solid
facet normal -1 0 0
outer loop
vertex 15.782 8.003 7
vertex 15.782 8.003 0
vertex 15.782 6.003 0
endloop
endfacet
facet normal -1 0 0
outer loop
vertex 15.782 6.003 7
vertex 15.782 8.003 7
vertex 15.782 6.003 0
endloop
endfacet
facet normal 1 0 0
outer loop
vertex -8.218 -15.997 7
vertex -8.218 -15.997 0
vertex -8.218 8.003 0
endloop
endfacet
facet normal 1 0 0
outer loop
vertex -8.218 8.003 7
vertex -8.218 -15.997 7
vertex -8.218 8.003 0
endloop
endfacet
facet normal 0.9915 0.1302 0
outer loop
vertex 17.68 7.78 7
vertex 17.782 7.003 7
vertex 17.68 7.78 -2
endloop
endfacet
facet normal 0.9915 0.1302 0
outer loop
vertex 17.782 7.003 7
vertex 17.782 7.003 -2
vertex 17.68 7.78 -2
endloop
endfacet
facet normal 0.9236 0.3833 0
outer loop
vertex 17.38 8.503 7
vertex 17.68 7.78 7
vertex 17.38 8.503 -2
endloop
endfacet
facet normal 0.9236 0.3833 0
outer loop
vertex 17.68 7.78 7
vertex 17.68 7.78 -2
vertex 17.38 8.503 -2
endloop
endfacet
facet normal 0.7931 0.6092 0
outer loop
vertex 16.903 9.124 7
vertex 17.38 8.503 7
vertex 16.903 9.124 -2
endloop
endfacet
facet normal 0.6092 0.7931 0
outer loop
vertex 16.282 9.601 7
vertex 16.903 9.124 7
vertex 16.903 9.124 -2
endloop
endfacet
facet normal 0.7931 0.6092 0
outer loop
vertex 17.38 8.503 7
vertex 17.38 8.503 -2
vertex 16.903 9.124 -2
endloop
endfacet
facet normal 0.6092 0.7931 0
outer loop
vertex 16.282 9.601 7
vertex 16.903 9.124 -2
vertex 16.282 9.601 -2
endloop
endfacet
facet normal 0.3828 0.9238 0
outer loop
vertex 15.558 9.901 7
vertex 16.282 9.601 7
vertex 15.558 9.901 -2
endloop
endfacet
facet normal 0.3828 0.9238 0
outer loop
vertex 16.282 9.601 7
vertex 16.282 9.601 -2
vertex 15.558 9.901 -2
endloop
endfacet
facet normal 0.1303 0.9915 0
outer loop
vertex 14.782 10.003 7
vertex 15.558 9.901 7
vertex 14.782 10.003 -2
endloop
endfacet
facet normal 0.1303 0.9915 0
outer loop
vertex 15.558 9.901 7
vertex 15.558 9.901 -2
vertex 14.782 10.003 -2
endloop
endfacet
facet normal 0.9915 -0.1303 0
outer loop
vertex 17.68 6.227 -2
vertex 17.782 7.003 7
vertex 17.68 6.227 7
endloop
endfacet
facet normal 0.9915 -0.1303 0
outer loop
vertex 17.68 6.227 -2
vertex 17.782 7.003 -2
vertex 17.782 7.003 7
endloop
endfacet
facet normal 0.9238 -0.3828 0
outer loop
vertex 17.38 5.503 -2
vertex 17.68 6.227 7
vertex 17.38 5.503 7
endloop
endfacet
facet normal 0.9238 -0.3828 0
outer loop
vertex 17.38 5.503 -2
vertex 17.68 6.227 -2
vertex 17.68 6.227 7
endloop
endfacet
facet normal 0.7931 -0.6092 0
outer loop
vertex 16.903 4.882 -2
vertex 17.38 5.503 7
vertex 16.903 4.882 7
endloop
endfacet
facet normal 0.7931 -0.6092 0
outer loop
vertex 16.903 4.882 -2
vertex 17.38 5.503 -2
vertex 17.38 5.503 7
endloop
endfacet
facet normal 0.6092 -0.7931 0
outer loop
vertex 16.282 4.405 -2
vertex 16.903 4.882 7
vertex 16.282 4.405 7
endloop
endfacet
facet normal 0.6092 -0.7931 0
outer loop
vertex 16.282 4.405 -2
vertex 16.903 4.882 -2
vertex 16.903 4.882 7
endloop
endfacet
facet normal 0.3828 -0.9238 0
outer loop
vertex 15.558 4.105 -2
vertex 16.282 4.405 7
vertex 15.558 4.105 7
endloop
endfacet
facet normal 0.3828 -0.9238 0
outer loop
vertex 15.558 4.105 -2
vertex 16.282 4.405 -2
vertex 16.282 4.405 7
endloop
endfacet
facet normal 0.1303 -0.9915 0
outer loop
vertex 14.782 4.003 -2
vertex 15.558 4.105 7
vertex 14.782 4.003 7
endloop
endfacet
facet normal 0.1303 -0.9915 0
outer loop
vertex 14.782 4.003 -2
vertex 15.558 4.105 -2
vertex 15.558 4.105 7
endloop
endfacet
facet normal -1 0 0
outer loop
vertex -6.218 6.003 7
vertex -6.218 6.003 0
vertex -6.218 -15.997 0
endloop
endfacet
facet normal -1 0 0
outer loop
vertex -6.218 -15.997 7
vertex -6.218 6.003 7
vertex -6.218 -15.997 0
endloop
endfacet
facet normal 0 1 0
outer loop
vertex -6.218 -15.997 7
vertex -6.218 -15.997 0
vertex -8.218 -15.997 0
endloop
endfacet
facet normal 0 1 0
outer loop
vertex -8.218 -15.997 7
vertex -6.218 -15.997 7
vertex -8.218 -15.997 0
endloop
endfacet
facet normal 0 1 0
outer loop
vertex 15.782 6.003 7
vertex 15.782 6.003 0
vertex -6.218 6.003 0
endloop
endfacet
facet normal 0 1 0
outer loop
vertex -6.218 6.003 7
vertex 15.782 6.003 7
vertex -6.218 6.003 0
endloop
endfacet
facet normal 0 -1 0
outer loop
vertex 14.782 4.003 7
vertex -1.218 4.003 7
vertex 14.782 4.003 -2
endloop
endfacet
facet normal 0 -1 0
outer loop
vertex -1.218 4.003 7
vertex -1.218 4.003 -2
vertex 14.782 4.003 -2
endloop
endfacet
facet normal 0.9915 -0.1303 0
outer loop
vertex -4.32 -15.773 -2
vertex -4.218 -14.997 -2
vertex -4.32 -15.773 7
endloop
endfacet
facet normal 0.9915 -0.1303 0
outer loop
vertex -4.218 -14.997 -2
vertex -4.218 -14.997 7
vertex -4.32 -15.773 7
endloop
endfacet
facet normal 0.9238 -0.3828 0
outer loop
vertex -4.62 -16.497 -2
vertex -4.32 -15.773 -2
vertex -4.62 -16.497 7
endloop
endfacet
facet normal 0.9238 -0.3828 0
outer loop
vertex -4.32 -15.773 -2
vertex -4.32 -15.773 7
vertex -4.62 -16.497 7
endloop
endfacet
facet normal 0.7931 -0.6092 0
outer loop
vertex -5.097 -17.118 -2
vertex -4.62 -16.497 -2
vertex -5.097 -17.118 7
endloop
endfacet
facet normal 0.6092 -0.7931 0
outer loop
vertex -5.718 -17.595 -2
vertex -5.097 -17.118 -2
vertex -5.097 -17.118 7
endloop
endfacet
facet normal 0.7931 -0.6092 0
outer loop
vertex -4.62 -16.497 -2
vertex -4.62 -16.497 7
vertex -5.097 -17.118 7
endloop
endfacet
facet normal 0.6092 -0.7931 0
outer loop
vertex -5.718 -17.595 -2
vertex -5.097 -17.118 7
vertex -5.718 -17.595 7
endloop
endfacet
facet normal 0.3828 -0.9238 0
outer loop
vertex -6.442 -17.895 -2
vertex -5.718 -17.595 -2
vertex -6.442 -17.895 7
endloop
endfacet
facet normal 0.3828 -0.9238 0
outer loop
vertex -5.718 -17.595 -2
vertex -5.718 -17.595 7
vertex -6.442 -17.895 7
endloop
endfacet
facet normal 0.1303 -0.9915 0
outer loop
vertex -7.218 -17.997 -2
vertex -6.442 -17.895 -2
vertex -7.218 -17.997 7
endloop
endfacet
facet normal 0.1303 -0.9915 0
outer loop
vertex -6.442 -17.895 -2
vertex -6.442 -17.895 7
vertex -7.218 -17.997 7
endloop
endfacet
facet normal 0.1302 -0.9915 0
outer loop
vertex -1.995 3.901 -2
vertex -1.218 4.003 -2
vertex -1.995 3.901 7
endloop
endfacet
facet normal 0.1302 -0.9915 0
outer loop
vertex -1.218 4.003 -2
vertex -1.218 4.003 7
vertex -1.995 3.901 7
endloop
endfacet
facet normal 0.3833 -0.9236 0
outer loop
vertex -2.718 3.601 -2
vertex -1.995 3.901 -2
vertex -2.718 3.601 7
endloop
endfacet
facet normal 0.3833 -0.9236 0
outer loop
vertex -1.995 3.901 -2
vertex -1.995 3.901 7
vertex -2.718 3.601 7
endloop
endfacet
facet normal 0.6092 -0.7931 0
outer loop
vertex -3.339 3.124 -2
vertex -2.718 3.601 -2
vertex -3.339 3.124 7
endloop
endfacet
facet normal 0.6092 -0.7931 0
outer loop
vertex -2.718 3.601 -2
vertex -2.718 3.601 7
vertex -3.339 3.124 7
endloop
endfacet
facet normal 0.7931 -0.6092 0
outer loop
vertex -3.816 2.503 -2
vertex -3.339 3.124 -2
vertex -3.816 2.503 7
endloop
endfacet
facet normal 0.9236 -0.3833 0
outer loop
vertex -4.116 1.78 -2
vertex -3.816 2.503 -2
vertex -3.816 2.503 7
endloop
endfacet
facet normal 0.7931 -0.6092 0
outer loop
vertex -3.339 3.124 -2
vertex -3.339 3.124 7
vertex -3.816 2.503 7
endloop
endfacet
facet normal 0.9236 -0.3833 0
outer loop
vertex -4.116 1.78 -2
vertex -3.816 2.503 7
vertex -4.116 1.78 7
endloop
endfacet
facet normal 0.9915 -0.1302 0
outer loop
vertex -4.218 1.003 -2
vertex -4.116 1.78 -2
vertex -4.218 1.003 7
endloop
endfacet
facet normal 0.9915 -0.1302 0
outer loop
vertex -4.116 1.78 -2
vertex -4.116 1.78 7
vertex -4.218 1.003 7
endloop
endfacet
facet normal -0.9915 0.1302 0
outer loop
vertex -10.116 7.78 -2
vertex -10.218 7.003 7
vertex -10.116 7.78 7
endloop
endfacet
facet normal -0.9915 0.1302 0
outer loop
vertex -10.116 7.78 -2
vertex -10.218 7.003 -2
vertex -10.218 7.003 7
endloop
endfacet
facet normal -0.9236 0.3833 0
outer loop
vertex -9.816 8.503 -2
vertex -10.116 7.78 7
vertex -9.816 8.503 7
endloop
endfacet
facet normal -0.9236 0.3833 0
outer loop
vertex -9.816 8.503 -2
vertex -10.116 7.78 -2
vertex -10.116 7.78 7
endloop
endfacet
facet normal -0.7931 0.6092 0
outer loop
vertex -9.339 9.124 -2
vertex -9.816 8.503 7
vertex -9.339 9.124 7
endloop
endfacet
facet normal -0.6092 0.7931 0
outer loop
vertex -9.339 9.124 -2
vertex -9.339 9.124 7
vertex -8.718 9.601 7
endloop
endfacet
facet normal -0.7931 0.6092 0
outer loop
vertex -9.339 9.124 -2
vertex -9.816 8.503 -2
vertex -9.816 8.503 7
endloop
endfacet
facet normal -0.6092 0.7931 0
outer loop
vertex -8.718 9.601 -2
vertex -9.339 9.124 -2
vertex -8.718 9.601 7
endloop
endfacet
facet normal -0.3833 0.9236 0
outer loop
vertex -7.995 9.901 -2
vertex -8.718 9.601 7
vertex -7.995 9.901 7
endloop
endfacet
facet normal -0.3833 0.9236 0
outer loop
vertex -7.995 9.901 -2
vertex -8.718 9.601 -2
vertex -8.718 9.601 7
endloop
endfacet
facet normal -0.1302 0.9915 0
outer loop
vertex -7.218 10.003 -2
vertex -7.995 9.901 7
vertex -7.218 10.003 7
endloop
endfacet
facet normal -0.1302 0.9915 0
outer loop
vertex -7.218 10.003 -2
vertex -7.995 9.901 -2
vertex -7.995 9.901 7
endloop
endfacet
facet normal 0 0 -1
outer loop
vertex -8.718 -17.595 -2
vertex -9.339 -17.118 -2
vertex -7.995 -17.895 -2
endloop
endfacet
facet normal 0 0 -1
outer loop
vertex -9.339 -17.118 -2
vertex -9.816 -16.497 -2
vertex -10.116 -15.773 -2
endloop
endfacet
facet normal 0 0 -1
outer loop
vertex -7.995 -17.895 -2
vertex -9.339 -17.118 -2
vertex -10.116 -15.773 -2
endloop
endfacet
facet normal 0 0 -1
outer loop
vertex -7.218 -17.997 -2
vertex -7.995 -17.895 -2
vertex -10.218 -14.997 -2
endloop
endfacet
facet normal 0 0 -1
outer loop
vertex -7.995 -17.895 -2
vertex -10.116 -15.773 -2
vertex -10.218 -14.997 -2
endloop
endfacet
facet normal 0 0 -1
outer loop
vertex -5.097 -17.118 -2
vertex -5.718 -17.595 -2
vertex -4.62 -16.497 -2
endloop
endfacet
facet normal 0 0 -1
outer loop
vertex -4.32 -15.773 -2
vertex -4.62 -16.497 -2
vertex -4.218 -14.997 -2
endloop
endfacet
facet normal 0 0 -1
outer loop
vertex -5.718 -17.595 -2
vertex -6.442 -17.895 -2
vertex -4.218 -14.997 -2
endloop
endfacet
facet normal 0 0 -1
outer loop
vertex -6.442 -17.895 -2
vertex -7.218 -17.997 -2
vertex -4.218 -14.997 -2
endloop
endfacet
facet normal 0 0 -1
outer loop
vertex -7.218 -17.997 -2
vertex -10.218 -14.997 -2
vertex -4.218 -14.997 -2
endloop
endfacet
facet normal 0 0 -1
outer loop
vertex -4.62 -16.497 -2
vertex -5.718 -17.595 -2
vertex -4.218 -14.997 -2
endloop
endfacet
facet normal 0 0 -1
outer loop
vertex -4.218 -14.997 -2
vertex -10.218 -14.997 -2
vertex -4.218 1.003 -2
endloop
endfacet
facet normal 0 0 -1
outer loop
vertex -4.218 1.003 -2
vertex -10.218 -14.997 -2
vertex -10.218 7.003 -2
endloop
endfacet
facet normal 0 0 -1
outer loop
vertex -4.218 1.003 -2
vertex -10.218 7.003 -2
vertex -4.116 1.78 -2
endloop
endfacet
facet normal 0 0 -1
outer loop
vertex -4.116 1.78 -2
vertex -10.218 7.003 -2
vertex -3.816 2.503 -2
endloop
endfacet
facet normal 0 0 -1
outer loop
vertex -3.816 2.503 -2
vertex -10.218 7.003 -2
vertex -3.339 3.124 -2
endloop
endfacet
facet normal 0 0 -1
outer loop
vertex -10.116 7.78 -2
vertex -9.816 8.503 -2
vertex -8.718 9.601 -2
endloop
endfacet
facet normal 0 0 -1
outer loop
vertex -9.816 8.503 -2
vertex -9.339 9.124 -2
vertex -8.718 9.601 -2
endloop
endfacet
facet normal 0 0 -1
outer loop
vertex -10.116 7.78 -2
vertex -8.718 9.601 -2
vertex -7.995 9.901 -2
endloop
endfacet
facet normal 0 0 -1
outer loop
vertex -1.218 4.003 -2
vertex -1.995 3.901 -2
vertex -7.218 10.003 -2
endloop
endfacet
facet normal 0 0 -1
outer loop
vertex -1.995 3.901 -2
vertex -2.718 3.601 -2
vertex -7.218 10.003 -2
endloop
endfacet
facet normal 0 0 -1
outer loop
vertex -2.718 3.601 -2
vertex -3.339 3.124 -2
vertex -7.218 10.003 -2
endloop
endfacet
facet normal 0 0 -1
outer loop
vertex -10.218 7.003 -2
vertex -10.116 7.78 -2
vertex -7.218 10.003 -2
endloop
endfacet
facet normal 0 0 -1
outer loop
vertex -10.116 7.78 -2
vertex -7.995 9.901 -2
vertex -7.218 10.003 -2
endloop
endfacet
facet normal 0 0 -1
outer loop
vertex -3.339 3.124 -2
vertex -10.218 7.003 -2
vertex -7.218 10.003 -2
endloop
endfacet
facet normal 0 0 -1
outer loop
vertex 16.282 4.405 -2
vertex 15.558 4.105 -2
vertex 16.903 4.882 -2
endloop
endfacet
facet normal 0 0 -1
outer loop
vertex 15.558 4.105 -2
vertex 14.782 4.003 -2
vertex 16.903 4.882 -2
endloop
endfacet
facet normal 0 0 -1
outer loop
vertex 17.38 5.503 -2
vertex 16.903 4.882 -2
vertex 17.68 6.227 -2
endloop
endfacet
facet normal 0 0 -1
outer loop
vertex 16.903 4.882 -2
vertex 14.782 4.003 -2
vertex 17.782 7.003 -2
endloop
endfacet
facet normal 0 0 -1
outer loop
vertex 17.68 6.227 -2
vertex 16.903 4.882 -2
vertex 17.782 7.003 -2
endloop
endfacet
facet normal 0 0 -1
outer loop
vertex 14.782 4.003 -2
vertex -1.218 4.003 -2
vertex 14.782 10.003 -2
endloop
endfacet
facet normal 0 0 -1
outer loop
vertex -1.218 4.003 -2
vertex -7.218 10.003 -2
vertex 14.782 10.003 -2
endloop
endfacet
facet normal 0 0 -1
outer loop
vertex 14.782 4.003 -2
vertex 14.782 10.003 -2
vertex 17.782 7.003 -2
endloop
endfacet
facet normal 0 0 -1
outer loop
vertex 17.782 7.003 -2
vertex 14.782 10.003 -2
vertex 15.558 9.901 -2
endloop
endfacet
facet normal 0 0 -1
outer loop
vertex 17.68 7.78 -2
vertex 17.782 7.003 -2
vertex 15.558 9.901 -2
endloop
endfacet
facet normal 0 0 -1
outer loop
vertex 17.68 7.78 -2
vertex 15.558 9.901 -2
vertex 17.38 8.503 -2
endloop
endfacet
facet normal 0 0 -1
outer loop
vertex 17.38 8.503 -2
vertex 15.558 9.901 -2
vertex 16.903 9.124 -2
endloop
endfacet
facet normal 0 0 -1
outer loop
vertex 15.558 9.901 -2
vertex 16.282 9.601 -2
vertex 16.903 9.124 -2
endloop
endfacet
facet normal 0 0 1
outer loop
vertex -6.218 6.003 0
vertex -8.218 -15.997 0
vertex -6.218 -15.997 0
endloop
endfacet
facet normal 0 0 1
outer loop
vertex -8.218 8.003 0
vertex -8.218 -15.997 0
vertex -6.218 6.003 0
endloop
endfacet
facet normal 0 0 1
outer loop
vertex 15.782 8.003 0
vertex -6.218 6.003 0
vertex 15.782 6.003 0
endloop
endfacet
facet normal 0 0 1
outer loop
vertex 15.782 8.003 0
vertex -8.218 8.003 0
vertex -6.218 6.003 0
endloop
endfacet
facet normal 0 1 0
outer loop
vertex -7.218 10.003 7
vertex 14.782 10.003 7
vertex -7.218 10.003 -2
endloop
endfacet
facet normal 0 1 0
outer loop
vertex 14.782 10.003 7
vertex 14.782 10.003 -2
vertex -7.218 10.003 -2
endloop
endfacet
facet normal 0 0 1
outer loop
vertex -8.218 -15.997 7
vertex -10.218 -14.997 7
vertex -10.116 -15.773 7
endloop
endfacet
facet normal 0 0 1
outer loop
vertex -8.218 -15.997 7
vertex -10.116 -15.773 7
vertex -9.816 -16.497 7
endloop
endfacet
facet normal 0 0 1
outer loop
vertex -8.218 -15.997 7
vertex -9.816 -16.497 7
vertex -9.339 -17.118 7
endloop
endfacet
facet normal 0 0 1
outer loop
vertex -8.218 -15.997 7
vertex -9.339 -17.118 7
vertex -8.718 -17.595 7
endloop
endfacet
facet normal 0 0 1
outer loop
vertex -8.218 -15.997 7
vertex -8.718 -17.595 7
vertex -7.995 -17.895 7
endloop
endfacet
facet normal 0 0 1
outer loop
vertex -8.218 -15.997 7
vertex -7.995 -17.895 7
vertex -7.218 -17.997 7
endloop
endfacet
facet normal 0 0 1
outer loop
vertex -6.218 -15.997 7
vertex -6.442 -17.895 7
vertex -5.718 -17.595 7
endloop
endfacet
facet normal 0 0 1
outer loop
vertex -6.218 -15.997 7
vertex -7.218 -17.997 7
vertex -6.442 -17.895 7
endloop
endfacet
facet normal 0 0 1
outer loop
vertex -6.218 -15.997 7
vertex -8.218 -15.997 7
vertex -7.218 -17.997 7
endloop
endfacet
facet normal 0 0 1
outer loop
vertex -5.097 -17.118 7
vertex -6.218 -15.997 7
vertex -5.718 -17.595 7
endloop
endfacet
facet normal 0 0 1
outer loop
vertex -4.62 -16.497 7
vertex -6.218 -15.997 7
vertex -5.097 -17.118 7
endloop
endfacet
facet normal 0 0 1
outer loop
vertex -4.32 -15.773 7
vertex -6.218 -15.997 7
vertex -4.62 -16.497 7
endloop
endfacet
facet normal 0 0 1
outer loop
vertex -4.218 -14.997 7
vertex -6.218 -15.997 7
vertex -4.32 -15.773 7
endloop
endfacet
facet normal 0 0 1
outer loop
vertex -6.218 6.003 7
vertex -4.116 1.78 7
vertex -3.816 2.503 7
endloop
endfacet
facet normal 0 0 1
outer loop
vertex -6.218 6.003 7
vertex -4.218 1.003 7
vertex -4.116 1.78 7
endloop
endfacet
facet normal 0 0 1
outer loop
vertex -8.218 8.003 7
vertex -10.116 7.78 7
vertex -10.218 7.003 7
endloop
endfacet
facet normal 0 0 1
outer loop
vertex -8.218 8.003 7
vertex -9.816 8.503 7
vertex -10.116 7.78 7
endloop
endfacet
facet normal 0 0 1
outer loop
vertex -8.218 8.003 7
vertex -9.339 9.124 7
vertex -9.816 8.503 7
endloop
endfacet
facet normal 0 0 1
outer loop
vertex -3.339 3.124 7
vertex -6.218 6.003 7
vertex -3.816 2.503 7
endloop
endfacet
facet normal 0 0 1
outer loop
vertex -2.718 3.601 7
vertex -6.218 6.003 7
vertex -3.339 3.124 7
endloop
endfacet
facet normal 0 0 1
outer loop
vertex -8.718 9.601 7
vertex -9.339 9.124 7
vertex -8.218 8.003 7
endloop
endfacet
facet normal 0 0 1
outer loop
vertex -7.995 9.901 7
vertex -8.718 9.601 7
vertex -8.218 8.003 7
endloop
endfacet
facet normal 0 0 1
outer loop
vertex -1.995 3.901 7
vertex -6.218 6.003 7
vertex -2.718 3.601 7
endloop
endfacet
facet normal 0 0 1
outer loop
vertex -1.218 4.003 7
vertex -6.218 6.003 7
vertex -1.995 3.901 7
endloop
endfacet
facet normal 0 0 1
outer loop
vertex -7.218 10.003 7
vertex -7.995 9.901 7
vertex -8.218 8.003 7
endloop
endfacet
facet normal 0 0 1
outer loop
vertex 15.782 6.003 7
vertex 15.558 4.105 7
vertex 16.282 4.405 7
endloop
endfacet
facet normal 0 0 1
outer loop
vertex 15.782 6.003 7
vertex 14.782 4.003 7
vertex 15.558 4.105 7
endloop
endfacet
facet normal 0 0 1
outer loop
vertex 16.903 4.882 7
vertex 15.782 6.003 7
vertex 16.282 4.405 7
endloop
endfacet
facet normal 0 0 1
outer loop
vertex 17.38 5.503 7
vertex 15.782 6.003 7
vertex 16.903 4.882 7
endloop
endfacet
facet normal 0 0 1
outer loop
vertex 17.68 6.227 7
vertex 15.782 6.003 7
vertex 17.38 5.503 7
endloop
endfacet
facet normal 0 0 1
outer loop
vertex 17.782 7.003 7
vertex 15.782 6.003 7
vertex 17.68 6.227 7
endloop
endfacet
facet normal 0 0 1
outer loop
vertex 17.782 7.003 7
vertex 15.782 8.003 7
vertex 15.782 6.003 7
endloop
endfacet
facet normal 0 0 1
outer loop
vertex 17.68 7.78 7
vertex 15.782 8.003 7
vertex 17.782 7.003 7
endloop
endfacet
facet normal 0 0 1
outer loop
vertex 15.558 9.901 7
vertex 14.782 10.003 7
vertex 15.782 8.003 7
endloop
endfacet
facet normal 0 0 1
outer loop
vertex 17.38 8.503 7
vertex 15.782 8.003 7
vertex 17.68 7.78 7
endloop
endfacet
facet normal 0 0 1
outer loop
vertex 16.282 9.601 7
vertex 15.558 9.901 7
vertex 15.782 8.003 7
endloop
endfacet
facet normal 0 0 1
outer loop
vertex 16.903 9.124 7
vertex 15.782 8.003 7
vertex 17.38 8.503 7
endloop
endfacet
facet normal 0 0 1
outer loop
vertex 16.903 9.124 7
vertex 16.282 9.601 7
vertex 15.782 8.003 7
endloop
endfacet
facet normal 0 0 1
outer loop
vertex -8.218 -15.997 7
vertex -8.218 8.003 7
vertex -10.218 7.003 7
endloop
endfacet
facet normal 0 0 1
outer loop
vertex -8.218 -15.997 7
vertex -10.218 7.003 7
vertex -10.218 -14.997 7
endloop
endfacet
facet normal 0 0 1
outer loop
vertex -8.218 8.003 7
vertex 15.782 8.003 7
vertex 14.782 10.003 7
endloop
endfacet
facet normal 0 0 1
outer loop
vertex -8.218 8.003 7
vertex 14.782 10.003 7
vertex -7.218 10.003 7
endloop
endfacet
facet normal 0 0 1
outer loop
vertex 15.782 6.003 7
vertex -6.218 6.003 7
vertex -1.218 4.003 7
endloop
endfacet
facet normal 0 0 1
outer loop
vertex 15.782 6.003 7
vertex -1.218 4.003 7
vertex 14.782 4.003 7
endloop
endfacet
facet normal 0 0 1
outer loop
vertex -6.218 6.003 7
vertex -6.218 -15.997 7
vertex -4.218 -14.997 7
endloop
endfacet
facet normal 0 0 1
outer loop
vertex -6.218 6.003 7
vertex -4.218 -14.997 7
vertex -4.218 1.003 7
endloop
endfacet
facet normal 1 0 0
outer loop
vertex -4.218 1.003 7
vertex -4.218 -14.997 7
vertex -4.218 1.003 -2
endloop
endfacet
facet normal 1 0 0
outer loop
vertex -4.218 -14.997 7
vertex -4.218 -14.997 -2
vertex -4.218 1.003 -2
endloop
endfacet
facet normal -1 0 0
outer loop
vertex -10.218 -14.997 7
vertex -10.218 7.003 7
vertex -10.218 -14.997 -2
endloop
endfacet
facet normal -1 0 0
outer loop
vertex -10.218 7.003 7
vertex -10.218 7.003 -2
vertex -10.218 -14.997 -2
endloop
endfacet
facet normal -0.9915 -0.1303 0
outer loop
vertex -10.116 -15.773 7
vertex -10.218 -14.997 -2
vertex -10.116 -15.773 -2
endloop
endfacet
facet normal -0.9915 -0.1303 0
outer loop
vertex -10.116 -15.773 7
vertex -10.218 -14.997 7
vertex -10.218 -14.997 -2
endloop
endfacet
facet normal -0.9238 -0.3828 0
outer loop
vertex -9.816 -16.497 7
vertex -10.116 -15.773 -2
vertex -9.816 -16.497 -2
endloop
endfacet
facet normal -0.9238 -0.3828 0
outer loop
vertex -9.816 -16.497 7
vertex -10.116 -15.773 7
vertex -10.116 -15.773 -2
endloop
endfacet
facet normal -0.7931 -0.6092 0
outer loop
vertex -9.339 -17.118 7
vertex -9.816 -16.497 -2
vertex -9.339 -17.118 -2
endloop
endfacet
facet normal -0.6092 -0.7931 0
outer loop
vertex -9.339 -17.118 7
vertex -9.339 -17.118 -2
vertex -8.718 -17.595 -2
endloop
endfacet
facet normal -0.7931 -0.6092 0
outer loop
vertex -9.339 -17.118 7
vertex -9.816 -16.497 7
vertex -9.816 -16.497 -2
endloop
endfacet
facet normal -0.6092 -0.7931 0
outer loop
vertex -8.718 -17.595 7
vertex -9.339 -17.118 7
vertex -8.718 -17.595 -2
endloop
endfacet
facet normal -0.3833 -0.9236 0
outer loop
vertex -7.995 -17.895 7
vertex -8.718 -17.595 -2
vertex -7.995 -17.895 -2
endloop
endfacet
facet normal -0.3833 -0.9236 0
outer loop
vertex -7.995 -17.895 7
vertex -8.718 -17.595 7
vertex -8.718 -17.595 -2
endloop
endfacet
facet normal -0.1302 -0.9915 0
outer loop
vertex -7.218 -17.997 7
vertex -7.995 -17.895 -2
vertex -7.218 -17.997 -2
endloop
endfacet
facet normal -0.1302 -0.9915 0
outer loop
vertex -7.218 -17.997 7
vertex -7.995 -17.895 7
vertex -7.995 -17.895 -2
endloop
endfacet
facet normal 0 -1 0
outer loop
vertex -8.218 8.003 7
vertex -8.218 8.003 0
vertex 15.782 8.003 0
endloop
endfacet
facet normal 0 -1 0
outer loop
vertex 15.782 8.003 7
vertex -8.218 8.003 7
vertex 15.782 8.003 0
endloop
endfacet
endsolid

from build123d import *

# Parameters (mm, degrees)
F1_DEPTH = 2
F2_DEPTH = 7
F3_R     = 2.99999


# Not quite as in the source:
# - a fillet or chamfer is up to 0.001 mm smaller than in the source, because OpenCascade refuses the exact size


with BuildPart() as f1:
    # F0 (on Top) → F1 (new body)
    with BuildSketch(Plane.XY):
        Polygon((15.7818826017, 10.0030450644), (-10.2181173983, 10.0030450644), (-10.2181173983, -15.9969549356), (-8.2181173983, -15.9969549356), (-8.2181173983, 8.0030450644), (15.7818826017, 8.0030450644), align=None)
        Polygon((15.7818826017, 6.0030450644), (15.7818826017, 8.0030450644), (-8.2181173983, 8.0030450644), (-8.2181173983, -15.9969549356), (-6.2181173983, -15.9969549356), (-6.2181173983, 6.0030450644), align=None)
        Polygon((15.7818826017, 4.0030450644), (15.7818826017, 6.0030450644), (-6.2181173983, 6.0030450644), (-6.2181173983, -15.9969549356), (-4.2181173983, -15.9969549356), (-4.2181173983, 4.0030450644), align=None)
        Polygon((17.7818826017, 10.0030450644), (15.7818826017, 10.0030450644), (15.7818826017, 8.0030450644), (15.7818826017, 6.0030450644), (15.7818826017, 4.0030450644), (17.7818826017, 4.0030450644), align=None)
        Polygon((-8.2181173983, -15.9969549356), (-10.2181173983, -15.9969549356), (-10.2181173983, -17.9969549356), (-4.2181173983, -17.9969549356), (-4.2181173983, -15.9969549356), (-6.2181173983, -15.9969549356), align=None)
    extrude(amount=-F1_DEPTH)

    # F0 (on Top) → F2 (join)
    with BuildSketch(Plane.XY):
        Polygon((15.7818826017, 10.0030450644), (-10.2181173983, 10.0030450644), (-10.2181173983, -15.9969549356), (-8.2181173983, -15.9969549356), (-8.2181173983, 8.0030450644), (15.7818826017, 8.0030450644), align=None)
        Polygon((15.7818826017, 4.0030450644), (15.7818826017, 6.0030450644), (-6.2181173983, 6.0030450644), (-6.2181173983, -15.9969549356), (-4.2181173983, -15.9969549356), (-4.2181173983, 4.0030450644), align=None)
        Polygon((17.7818826017, 10.0030450644), (15.7818826017, 10.0030450644), (15.7818826017, 8.0030450644), (15.7818826017, 6.0030450644), (15.7818826017, 4.0030450644), (17.7818826017, 4.0030450644), align=None)
        Polygon((-8.2181173983, -15.9969549356), (-10.2181173983, -15.9969549356), (-10.2181173983, -17.9969549356), (-4.2181173983, -17.9969549356), (-4.2181173983, -15.9969549356), (-6.2181173983, -15.9969549356), align=None)
    extrude(amount=F2_DEPTH)

    # F3 (radius 3 in the source; OpenCascade refuses exactly that, so slightly less here)
    f3_edges = [f1.edges().sort_by_distance(p)[0] for p in [
        (-4.218117, 4.003045, 2.5),
        (-10.218117, 10.003045, 2.5),
        (-10.218117, -17.996955, 2.5),
        (-4.218117, -17.996955, 2.5),
        (17.781883, 4.003045, 2.5),
        (17.781883, 10.003045, 2.5),
    ]]
    fillet(f3_edges, radius=F3_R)


solid = f1.part
